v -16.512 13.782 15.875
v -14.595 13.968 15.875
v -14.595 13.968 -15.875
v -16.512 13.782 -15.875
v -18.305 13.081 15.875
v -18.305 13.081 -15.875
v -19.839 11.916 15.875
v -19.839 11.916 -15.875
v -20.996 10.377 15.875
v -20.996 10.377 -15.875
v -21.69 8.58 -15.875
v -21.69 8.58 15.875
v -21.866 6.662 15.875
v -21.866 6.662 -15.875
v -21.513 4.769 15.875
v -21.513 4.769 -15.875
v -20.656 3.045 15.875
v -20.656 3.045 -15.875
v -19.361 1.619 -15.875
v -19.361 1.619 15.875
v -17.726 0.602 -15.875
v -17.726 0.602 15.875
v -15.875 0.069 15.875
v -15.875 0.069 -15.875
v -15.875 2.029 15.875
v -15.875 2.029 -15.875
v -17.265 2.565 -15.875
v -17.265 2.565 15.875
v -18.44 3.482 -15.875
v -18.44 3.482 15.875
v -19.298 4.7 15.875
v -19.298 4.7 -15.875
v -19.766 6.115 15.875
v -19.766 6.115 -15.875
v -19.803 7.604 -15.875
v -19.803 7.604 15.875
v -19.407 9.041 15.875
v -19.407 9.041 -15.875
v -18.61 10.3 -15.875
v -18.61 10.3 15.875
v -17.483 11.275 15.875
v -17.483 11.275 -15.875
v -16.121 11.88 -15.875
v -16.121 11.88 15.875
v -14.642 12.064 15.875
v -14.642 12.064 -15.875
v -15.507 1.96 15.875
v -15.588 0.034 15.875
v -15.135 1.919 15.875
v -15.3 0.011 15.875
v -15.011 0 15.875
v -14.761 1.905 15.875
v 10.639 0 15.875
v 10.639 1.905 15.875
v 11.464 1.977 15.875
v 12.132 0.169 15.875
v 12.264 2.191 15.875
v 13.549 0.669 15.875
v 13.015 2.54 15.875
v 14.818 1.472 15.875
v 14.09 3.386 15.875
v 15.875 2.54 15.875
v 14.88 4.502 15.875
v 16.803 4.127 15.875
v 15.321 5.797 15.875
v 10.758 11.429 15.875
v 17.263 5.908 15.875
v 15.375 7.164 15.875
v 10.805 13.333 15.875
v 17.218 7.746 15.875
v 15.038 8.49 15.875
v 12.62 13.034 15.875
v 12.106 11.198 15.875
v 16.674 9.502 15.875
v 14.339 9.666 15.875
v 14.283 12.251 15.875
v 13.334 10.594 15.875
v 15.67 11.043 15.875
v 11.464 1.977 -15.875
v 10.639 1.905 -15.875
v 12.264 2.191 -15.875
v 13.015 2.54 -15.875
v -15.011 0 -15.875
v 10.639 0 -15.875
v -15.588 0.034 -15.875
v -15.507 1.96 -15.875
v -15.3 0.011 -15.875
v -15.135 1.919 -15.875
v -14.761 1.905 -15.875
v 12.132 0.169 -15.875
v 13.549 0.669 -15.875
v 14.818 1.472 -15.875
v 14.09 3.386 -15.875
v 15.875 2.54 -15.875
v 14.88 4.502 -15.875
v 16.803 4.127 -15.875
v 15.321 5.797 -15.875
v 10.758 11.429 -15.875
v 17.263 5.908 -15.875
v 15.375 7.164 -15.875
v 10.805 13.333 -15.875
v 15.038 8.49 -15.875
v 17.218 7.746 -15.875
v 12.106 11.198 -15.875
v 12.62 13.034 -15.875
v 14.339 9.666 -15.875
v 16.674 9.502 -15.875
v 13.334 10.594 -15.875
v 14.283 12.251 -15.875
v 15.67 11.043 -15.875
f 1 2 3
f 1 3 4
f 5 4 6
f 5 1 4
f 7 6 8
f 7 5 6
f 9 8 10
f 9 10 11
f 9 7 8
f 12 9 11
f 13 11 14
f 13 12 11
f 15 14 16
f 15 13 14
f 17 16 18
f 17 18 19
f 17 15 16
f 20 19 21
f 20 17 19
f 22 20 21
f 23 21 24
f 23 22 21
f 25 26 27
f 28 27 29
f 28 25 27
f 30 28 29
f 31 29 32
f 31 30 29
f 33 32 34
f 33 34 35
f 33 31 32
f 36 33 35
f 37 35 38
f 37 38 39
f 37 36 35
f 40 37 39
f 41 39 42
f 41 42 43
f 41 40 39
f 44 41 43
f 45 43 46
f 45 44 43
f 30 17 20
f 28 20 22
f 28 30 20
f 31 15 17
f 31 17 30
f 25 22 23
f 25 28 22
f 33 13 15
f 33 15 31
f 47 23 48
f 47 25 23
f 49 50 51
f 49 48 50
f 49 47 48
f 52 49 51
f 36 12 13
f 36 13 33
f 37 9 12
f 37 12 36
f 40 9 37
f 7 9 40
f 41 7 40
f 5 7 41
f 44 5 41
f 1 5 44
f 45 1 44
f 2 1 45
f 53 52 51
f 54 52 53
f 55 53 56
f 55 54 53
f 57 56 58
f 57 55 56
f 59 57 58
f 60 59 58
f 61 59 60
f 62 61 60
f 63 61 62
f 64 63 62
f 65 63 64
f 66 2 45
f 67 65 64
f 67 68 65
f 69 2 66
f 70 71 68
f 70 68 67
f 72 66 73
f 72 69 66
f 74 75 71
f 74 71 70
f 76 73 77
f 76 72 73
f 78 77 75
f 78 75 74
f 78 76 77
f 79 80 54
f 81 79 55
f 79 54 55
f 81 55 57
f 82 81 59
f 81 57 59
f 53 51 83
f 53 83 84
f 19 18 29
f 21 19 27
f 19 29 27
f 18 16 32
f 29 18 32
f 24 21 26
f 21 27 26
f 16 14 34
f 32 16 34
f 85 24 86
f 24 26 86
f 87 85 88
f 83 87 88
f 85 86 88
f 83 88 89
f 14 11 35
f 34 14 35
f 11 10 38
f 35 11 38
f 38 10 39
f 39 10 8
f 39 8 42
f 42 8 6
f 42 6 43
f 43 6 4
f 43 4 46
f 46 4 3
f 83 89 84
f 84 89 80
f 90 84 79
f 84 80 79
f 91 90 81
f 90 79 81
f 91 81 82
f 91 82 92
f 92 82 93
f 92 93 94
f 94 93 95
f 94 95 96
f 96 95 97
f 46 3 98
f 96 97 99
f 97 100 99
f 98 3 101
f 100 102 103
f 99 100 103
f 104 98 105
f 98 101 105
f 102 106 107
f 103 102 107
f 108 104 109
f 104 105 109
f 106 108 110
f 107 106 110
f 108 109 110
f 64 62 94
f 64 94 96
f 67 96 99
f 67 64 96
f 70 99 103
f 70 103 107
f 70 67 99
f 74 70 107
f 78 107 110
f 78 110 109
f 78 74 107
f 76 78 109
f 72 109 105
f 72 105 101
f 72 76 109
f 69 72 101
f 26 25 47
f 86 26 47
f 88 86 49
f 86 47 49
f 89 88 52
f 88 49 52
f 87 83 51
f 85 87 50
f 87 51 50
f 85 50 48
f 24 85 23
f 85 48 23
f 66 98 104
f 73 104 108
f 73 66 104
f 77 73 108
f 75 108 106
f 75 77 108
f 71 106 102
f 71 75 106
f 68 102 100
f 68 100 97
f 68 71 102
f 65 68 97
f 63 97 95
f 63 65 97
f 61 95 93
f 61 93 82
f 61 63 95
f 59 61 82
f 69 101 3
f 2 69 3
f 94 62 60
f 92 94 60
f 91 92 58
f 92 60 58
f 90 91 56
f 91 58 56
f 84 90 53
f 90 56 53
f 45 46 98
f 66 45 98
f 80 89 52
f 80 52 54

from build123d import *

# Parameters (mm, degrees)
SKETCH1_W           = 31.75
SKETCH1_H           = 31.75
BOSS_EXTRUDE1_DEPTH = 2.54
BOSS_EXTRUDE2_DEPTH = 31.75
CUT_EXTRUDE1_DEPTH  = 42.009788671


with BuildPart() as part:
    # Sketch1 → Boss-Extrude1 (new body)
    with BuildSketch(Plane(origin=(0, 0, 0), x_dir=(1, 0, 0), z_dir=(0, 1, 0))):
        Rectangle(SKETCH1_W, SKETCH1_H)
    extrude(amount=BOSS_EXTRUDE1_DEPTH)

    # Sketch2 → Boss-Extrude2 (add, through all)
    with BuildSketch(Plane.XY.offset(15.875)):
        with BuildLine():
            ThreePointArc((10.757698592, 11.42851198), (15.254678119, 7.83956856), (13.014608296, 2.54))
            Line((13.014608296, 2.54), (15.875, 2.54))
            ThreePointArc((15.875, 2.54), (16.673544098, 9.502227526), (10.805315687, 13.332916772))
            Line((10.805315687, 13.332916772), (-14.594684313, 13.9680098))
            ThreePointArc((-14.594684313, 13.9680098), (-21.844382089, 7.62745208), (-15.875, 0.069193847))
            Line((-15.875, 0.069193847), (-15.875, 2.028572795))
            ThreePointArc((-15.875, 2.028572795), (-19.803445065, 7.604369283), (-14.642301408, 12.063605008))
            Line((-14.642301408, 12.063605008), (10.757698592, 11.42851198))
        make_face()
        with BuildLine():
            ThreePointArc((13.014608296, 2.54), (11.868328068, 2.066487883), (10.638655855, 1.905))
            Line((10.638655855, 1.905), (-14.761344145, 1.905))
            ThreePointArc((-14.761344145, 1.905), (-15.321589537, 1.93598771), (-15.875, 2.028572795))
            Line((-15.875, 2.028572795), (-15.875, 0.069193847))
            ThreePointArc((-15.875, 0.069193847), (-15.444137647, 0.021191286), (-15.011127782, 0))
            Line((-15.011127782, 0), (-14.761344145, 0))
            Line((-14.761344145, 0), (10.638655855, 0))
            ThreePointArc((10.638655855, 0), (13.548591422, 0.668514148), (15.875, 2.54))
            Line((15.875, 2.54), (13.014608296, 2.54))
        make_face()
    extrude(amount=-BOSS_EXTRUDE2_DEPTH)

    # Sketch3 → Cut-Extrude1 (cut, through all)
    with BuildSketch(Plane.XY.offset(15.875)):
        with BuildLine():
            Line((13.014608296, 2.54), (-15.875, 2.54))
            Line((-15.875, 2.54), (-15.875, 2.028572795))
            ThreePointArc((-15.875, 2.028572795), (-15.321589537, 1.93598771), (-14.761344145, 1.905))
            Line((-14.761344145, 1.905), (10.638655855, 1.905))
            ThreePointArc((10.638655855, 1.905), (11.868328068, 2.066487883), (13.014608296, 2.54))
        make_face()
        with BuildLine():
            Line((15.875, 0), (15.875, 2.54))
            ThreePointArc((15.875, 2.54), (13.548591422, 0.668514148), (10.638655855, 0))
            Line((10.638655855, 0), (15.875, 0))
        make_face()
        with BuildLine():
            Line((-15.875, 0), (-15.011127782, 0))
            ThreePointArc((-15.011127782, 0), (-15.444137647, 0.021191286), (-15.875, 0.069193847))
            Line((-15.875, 0.069193847), (-15.875, 0))
        make_face()
    extrude(amount=-CUT_EXTRUDE1_DEPTH, mode=Mode.SUBTRACT)


solid = part.part
